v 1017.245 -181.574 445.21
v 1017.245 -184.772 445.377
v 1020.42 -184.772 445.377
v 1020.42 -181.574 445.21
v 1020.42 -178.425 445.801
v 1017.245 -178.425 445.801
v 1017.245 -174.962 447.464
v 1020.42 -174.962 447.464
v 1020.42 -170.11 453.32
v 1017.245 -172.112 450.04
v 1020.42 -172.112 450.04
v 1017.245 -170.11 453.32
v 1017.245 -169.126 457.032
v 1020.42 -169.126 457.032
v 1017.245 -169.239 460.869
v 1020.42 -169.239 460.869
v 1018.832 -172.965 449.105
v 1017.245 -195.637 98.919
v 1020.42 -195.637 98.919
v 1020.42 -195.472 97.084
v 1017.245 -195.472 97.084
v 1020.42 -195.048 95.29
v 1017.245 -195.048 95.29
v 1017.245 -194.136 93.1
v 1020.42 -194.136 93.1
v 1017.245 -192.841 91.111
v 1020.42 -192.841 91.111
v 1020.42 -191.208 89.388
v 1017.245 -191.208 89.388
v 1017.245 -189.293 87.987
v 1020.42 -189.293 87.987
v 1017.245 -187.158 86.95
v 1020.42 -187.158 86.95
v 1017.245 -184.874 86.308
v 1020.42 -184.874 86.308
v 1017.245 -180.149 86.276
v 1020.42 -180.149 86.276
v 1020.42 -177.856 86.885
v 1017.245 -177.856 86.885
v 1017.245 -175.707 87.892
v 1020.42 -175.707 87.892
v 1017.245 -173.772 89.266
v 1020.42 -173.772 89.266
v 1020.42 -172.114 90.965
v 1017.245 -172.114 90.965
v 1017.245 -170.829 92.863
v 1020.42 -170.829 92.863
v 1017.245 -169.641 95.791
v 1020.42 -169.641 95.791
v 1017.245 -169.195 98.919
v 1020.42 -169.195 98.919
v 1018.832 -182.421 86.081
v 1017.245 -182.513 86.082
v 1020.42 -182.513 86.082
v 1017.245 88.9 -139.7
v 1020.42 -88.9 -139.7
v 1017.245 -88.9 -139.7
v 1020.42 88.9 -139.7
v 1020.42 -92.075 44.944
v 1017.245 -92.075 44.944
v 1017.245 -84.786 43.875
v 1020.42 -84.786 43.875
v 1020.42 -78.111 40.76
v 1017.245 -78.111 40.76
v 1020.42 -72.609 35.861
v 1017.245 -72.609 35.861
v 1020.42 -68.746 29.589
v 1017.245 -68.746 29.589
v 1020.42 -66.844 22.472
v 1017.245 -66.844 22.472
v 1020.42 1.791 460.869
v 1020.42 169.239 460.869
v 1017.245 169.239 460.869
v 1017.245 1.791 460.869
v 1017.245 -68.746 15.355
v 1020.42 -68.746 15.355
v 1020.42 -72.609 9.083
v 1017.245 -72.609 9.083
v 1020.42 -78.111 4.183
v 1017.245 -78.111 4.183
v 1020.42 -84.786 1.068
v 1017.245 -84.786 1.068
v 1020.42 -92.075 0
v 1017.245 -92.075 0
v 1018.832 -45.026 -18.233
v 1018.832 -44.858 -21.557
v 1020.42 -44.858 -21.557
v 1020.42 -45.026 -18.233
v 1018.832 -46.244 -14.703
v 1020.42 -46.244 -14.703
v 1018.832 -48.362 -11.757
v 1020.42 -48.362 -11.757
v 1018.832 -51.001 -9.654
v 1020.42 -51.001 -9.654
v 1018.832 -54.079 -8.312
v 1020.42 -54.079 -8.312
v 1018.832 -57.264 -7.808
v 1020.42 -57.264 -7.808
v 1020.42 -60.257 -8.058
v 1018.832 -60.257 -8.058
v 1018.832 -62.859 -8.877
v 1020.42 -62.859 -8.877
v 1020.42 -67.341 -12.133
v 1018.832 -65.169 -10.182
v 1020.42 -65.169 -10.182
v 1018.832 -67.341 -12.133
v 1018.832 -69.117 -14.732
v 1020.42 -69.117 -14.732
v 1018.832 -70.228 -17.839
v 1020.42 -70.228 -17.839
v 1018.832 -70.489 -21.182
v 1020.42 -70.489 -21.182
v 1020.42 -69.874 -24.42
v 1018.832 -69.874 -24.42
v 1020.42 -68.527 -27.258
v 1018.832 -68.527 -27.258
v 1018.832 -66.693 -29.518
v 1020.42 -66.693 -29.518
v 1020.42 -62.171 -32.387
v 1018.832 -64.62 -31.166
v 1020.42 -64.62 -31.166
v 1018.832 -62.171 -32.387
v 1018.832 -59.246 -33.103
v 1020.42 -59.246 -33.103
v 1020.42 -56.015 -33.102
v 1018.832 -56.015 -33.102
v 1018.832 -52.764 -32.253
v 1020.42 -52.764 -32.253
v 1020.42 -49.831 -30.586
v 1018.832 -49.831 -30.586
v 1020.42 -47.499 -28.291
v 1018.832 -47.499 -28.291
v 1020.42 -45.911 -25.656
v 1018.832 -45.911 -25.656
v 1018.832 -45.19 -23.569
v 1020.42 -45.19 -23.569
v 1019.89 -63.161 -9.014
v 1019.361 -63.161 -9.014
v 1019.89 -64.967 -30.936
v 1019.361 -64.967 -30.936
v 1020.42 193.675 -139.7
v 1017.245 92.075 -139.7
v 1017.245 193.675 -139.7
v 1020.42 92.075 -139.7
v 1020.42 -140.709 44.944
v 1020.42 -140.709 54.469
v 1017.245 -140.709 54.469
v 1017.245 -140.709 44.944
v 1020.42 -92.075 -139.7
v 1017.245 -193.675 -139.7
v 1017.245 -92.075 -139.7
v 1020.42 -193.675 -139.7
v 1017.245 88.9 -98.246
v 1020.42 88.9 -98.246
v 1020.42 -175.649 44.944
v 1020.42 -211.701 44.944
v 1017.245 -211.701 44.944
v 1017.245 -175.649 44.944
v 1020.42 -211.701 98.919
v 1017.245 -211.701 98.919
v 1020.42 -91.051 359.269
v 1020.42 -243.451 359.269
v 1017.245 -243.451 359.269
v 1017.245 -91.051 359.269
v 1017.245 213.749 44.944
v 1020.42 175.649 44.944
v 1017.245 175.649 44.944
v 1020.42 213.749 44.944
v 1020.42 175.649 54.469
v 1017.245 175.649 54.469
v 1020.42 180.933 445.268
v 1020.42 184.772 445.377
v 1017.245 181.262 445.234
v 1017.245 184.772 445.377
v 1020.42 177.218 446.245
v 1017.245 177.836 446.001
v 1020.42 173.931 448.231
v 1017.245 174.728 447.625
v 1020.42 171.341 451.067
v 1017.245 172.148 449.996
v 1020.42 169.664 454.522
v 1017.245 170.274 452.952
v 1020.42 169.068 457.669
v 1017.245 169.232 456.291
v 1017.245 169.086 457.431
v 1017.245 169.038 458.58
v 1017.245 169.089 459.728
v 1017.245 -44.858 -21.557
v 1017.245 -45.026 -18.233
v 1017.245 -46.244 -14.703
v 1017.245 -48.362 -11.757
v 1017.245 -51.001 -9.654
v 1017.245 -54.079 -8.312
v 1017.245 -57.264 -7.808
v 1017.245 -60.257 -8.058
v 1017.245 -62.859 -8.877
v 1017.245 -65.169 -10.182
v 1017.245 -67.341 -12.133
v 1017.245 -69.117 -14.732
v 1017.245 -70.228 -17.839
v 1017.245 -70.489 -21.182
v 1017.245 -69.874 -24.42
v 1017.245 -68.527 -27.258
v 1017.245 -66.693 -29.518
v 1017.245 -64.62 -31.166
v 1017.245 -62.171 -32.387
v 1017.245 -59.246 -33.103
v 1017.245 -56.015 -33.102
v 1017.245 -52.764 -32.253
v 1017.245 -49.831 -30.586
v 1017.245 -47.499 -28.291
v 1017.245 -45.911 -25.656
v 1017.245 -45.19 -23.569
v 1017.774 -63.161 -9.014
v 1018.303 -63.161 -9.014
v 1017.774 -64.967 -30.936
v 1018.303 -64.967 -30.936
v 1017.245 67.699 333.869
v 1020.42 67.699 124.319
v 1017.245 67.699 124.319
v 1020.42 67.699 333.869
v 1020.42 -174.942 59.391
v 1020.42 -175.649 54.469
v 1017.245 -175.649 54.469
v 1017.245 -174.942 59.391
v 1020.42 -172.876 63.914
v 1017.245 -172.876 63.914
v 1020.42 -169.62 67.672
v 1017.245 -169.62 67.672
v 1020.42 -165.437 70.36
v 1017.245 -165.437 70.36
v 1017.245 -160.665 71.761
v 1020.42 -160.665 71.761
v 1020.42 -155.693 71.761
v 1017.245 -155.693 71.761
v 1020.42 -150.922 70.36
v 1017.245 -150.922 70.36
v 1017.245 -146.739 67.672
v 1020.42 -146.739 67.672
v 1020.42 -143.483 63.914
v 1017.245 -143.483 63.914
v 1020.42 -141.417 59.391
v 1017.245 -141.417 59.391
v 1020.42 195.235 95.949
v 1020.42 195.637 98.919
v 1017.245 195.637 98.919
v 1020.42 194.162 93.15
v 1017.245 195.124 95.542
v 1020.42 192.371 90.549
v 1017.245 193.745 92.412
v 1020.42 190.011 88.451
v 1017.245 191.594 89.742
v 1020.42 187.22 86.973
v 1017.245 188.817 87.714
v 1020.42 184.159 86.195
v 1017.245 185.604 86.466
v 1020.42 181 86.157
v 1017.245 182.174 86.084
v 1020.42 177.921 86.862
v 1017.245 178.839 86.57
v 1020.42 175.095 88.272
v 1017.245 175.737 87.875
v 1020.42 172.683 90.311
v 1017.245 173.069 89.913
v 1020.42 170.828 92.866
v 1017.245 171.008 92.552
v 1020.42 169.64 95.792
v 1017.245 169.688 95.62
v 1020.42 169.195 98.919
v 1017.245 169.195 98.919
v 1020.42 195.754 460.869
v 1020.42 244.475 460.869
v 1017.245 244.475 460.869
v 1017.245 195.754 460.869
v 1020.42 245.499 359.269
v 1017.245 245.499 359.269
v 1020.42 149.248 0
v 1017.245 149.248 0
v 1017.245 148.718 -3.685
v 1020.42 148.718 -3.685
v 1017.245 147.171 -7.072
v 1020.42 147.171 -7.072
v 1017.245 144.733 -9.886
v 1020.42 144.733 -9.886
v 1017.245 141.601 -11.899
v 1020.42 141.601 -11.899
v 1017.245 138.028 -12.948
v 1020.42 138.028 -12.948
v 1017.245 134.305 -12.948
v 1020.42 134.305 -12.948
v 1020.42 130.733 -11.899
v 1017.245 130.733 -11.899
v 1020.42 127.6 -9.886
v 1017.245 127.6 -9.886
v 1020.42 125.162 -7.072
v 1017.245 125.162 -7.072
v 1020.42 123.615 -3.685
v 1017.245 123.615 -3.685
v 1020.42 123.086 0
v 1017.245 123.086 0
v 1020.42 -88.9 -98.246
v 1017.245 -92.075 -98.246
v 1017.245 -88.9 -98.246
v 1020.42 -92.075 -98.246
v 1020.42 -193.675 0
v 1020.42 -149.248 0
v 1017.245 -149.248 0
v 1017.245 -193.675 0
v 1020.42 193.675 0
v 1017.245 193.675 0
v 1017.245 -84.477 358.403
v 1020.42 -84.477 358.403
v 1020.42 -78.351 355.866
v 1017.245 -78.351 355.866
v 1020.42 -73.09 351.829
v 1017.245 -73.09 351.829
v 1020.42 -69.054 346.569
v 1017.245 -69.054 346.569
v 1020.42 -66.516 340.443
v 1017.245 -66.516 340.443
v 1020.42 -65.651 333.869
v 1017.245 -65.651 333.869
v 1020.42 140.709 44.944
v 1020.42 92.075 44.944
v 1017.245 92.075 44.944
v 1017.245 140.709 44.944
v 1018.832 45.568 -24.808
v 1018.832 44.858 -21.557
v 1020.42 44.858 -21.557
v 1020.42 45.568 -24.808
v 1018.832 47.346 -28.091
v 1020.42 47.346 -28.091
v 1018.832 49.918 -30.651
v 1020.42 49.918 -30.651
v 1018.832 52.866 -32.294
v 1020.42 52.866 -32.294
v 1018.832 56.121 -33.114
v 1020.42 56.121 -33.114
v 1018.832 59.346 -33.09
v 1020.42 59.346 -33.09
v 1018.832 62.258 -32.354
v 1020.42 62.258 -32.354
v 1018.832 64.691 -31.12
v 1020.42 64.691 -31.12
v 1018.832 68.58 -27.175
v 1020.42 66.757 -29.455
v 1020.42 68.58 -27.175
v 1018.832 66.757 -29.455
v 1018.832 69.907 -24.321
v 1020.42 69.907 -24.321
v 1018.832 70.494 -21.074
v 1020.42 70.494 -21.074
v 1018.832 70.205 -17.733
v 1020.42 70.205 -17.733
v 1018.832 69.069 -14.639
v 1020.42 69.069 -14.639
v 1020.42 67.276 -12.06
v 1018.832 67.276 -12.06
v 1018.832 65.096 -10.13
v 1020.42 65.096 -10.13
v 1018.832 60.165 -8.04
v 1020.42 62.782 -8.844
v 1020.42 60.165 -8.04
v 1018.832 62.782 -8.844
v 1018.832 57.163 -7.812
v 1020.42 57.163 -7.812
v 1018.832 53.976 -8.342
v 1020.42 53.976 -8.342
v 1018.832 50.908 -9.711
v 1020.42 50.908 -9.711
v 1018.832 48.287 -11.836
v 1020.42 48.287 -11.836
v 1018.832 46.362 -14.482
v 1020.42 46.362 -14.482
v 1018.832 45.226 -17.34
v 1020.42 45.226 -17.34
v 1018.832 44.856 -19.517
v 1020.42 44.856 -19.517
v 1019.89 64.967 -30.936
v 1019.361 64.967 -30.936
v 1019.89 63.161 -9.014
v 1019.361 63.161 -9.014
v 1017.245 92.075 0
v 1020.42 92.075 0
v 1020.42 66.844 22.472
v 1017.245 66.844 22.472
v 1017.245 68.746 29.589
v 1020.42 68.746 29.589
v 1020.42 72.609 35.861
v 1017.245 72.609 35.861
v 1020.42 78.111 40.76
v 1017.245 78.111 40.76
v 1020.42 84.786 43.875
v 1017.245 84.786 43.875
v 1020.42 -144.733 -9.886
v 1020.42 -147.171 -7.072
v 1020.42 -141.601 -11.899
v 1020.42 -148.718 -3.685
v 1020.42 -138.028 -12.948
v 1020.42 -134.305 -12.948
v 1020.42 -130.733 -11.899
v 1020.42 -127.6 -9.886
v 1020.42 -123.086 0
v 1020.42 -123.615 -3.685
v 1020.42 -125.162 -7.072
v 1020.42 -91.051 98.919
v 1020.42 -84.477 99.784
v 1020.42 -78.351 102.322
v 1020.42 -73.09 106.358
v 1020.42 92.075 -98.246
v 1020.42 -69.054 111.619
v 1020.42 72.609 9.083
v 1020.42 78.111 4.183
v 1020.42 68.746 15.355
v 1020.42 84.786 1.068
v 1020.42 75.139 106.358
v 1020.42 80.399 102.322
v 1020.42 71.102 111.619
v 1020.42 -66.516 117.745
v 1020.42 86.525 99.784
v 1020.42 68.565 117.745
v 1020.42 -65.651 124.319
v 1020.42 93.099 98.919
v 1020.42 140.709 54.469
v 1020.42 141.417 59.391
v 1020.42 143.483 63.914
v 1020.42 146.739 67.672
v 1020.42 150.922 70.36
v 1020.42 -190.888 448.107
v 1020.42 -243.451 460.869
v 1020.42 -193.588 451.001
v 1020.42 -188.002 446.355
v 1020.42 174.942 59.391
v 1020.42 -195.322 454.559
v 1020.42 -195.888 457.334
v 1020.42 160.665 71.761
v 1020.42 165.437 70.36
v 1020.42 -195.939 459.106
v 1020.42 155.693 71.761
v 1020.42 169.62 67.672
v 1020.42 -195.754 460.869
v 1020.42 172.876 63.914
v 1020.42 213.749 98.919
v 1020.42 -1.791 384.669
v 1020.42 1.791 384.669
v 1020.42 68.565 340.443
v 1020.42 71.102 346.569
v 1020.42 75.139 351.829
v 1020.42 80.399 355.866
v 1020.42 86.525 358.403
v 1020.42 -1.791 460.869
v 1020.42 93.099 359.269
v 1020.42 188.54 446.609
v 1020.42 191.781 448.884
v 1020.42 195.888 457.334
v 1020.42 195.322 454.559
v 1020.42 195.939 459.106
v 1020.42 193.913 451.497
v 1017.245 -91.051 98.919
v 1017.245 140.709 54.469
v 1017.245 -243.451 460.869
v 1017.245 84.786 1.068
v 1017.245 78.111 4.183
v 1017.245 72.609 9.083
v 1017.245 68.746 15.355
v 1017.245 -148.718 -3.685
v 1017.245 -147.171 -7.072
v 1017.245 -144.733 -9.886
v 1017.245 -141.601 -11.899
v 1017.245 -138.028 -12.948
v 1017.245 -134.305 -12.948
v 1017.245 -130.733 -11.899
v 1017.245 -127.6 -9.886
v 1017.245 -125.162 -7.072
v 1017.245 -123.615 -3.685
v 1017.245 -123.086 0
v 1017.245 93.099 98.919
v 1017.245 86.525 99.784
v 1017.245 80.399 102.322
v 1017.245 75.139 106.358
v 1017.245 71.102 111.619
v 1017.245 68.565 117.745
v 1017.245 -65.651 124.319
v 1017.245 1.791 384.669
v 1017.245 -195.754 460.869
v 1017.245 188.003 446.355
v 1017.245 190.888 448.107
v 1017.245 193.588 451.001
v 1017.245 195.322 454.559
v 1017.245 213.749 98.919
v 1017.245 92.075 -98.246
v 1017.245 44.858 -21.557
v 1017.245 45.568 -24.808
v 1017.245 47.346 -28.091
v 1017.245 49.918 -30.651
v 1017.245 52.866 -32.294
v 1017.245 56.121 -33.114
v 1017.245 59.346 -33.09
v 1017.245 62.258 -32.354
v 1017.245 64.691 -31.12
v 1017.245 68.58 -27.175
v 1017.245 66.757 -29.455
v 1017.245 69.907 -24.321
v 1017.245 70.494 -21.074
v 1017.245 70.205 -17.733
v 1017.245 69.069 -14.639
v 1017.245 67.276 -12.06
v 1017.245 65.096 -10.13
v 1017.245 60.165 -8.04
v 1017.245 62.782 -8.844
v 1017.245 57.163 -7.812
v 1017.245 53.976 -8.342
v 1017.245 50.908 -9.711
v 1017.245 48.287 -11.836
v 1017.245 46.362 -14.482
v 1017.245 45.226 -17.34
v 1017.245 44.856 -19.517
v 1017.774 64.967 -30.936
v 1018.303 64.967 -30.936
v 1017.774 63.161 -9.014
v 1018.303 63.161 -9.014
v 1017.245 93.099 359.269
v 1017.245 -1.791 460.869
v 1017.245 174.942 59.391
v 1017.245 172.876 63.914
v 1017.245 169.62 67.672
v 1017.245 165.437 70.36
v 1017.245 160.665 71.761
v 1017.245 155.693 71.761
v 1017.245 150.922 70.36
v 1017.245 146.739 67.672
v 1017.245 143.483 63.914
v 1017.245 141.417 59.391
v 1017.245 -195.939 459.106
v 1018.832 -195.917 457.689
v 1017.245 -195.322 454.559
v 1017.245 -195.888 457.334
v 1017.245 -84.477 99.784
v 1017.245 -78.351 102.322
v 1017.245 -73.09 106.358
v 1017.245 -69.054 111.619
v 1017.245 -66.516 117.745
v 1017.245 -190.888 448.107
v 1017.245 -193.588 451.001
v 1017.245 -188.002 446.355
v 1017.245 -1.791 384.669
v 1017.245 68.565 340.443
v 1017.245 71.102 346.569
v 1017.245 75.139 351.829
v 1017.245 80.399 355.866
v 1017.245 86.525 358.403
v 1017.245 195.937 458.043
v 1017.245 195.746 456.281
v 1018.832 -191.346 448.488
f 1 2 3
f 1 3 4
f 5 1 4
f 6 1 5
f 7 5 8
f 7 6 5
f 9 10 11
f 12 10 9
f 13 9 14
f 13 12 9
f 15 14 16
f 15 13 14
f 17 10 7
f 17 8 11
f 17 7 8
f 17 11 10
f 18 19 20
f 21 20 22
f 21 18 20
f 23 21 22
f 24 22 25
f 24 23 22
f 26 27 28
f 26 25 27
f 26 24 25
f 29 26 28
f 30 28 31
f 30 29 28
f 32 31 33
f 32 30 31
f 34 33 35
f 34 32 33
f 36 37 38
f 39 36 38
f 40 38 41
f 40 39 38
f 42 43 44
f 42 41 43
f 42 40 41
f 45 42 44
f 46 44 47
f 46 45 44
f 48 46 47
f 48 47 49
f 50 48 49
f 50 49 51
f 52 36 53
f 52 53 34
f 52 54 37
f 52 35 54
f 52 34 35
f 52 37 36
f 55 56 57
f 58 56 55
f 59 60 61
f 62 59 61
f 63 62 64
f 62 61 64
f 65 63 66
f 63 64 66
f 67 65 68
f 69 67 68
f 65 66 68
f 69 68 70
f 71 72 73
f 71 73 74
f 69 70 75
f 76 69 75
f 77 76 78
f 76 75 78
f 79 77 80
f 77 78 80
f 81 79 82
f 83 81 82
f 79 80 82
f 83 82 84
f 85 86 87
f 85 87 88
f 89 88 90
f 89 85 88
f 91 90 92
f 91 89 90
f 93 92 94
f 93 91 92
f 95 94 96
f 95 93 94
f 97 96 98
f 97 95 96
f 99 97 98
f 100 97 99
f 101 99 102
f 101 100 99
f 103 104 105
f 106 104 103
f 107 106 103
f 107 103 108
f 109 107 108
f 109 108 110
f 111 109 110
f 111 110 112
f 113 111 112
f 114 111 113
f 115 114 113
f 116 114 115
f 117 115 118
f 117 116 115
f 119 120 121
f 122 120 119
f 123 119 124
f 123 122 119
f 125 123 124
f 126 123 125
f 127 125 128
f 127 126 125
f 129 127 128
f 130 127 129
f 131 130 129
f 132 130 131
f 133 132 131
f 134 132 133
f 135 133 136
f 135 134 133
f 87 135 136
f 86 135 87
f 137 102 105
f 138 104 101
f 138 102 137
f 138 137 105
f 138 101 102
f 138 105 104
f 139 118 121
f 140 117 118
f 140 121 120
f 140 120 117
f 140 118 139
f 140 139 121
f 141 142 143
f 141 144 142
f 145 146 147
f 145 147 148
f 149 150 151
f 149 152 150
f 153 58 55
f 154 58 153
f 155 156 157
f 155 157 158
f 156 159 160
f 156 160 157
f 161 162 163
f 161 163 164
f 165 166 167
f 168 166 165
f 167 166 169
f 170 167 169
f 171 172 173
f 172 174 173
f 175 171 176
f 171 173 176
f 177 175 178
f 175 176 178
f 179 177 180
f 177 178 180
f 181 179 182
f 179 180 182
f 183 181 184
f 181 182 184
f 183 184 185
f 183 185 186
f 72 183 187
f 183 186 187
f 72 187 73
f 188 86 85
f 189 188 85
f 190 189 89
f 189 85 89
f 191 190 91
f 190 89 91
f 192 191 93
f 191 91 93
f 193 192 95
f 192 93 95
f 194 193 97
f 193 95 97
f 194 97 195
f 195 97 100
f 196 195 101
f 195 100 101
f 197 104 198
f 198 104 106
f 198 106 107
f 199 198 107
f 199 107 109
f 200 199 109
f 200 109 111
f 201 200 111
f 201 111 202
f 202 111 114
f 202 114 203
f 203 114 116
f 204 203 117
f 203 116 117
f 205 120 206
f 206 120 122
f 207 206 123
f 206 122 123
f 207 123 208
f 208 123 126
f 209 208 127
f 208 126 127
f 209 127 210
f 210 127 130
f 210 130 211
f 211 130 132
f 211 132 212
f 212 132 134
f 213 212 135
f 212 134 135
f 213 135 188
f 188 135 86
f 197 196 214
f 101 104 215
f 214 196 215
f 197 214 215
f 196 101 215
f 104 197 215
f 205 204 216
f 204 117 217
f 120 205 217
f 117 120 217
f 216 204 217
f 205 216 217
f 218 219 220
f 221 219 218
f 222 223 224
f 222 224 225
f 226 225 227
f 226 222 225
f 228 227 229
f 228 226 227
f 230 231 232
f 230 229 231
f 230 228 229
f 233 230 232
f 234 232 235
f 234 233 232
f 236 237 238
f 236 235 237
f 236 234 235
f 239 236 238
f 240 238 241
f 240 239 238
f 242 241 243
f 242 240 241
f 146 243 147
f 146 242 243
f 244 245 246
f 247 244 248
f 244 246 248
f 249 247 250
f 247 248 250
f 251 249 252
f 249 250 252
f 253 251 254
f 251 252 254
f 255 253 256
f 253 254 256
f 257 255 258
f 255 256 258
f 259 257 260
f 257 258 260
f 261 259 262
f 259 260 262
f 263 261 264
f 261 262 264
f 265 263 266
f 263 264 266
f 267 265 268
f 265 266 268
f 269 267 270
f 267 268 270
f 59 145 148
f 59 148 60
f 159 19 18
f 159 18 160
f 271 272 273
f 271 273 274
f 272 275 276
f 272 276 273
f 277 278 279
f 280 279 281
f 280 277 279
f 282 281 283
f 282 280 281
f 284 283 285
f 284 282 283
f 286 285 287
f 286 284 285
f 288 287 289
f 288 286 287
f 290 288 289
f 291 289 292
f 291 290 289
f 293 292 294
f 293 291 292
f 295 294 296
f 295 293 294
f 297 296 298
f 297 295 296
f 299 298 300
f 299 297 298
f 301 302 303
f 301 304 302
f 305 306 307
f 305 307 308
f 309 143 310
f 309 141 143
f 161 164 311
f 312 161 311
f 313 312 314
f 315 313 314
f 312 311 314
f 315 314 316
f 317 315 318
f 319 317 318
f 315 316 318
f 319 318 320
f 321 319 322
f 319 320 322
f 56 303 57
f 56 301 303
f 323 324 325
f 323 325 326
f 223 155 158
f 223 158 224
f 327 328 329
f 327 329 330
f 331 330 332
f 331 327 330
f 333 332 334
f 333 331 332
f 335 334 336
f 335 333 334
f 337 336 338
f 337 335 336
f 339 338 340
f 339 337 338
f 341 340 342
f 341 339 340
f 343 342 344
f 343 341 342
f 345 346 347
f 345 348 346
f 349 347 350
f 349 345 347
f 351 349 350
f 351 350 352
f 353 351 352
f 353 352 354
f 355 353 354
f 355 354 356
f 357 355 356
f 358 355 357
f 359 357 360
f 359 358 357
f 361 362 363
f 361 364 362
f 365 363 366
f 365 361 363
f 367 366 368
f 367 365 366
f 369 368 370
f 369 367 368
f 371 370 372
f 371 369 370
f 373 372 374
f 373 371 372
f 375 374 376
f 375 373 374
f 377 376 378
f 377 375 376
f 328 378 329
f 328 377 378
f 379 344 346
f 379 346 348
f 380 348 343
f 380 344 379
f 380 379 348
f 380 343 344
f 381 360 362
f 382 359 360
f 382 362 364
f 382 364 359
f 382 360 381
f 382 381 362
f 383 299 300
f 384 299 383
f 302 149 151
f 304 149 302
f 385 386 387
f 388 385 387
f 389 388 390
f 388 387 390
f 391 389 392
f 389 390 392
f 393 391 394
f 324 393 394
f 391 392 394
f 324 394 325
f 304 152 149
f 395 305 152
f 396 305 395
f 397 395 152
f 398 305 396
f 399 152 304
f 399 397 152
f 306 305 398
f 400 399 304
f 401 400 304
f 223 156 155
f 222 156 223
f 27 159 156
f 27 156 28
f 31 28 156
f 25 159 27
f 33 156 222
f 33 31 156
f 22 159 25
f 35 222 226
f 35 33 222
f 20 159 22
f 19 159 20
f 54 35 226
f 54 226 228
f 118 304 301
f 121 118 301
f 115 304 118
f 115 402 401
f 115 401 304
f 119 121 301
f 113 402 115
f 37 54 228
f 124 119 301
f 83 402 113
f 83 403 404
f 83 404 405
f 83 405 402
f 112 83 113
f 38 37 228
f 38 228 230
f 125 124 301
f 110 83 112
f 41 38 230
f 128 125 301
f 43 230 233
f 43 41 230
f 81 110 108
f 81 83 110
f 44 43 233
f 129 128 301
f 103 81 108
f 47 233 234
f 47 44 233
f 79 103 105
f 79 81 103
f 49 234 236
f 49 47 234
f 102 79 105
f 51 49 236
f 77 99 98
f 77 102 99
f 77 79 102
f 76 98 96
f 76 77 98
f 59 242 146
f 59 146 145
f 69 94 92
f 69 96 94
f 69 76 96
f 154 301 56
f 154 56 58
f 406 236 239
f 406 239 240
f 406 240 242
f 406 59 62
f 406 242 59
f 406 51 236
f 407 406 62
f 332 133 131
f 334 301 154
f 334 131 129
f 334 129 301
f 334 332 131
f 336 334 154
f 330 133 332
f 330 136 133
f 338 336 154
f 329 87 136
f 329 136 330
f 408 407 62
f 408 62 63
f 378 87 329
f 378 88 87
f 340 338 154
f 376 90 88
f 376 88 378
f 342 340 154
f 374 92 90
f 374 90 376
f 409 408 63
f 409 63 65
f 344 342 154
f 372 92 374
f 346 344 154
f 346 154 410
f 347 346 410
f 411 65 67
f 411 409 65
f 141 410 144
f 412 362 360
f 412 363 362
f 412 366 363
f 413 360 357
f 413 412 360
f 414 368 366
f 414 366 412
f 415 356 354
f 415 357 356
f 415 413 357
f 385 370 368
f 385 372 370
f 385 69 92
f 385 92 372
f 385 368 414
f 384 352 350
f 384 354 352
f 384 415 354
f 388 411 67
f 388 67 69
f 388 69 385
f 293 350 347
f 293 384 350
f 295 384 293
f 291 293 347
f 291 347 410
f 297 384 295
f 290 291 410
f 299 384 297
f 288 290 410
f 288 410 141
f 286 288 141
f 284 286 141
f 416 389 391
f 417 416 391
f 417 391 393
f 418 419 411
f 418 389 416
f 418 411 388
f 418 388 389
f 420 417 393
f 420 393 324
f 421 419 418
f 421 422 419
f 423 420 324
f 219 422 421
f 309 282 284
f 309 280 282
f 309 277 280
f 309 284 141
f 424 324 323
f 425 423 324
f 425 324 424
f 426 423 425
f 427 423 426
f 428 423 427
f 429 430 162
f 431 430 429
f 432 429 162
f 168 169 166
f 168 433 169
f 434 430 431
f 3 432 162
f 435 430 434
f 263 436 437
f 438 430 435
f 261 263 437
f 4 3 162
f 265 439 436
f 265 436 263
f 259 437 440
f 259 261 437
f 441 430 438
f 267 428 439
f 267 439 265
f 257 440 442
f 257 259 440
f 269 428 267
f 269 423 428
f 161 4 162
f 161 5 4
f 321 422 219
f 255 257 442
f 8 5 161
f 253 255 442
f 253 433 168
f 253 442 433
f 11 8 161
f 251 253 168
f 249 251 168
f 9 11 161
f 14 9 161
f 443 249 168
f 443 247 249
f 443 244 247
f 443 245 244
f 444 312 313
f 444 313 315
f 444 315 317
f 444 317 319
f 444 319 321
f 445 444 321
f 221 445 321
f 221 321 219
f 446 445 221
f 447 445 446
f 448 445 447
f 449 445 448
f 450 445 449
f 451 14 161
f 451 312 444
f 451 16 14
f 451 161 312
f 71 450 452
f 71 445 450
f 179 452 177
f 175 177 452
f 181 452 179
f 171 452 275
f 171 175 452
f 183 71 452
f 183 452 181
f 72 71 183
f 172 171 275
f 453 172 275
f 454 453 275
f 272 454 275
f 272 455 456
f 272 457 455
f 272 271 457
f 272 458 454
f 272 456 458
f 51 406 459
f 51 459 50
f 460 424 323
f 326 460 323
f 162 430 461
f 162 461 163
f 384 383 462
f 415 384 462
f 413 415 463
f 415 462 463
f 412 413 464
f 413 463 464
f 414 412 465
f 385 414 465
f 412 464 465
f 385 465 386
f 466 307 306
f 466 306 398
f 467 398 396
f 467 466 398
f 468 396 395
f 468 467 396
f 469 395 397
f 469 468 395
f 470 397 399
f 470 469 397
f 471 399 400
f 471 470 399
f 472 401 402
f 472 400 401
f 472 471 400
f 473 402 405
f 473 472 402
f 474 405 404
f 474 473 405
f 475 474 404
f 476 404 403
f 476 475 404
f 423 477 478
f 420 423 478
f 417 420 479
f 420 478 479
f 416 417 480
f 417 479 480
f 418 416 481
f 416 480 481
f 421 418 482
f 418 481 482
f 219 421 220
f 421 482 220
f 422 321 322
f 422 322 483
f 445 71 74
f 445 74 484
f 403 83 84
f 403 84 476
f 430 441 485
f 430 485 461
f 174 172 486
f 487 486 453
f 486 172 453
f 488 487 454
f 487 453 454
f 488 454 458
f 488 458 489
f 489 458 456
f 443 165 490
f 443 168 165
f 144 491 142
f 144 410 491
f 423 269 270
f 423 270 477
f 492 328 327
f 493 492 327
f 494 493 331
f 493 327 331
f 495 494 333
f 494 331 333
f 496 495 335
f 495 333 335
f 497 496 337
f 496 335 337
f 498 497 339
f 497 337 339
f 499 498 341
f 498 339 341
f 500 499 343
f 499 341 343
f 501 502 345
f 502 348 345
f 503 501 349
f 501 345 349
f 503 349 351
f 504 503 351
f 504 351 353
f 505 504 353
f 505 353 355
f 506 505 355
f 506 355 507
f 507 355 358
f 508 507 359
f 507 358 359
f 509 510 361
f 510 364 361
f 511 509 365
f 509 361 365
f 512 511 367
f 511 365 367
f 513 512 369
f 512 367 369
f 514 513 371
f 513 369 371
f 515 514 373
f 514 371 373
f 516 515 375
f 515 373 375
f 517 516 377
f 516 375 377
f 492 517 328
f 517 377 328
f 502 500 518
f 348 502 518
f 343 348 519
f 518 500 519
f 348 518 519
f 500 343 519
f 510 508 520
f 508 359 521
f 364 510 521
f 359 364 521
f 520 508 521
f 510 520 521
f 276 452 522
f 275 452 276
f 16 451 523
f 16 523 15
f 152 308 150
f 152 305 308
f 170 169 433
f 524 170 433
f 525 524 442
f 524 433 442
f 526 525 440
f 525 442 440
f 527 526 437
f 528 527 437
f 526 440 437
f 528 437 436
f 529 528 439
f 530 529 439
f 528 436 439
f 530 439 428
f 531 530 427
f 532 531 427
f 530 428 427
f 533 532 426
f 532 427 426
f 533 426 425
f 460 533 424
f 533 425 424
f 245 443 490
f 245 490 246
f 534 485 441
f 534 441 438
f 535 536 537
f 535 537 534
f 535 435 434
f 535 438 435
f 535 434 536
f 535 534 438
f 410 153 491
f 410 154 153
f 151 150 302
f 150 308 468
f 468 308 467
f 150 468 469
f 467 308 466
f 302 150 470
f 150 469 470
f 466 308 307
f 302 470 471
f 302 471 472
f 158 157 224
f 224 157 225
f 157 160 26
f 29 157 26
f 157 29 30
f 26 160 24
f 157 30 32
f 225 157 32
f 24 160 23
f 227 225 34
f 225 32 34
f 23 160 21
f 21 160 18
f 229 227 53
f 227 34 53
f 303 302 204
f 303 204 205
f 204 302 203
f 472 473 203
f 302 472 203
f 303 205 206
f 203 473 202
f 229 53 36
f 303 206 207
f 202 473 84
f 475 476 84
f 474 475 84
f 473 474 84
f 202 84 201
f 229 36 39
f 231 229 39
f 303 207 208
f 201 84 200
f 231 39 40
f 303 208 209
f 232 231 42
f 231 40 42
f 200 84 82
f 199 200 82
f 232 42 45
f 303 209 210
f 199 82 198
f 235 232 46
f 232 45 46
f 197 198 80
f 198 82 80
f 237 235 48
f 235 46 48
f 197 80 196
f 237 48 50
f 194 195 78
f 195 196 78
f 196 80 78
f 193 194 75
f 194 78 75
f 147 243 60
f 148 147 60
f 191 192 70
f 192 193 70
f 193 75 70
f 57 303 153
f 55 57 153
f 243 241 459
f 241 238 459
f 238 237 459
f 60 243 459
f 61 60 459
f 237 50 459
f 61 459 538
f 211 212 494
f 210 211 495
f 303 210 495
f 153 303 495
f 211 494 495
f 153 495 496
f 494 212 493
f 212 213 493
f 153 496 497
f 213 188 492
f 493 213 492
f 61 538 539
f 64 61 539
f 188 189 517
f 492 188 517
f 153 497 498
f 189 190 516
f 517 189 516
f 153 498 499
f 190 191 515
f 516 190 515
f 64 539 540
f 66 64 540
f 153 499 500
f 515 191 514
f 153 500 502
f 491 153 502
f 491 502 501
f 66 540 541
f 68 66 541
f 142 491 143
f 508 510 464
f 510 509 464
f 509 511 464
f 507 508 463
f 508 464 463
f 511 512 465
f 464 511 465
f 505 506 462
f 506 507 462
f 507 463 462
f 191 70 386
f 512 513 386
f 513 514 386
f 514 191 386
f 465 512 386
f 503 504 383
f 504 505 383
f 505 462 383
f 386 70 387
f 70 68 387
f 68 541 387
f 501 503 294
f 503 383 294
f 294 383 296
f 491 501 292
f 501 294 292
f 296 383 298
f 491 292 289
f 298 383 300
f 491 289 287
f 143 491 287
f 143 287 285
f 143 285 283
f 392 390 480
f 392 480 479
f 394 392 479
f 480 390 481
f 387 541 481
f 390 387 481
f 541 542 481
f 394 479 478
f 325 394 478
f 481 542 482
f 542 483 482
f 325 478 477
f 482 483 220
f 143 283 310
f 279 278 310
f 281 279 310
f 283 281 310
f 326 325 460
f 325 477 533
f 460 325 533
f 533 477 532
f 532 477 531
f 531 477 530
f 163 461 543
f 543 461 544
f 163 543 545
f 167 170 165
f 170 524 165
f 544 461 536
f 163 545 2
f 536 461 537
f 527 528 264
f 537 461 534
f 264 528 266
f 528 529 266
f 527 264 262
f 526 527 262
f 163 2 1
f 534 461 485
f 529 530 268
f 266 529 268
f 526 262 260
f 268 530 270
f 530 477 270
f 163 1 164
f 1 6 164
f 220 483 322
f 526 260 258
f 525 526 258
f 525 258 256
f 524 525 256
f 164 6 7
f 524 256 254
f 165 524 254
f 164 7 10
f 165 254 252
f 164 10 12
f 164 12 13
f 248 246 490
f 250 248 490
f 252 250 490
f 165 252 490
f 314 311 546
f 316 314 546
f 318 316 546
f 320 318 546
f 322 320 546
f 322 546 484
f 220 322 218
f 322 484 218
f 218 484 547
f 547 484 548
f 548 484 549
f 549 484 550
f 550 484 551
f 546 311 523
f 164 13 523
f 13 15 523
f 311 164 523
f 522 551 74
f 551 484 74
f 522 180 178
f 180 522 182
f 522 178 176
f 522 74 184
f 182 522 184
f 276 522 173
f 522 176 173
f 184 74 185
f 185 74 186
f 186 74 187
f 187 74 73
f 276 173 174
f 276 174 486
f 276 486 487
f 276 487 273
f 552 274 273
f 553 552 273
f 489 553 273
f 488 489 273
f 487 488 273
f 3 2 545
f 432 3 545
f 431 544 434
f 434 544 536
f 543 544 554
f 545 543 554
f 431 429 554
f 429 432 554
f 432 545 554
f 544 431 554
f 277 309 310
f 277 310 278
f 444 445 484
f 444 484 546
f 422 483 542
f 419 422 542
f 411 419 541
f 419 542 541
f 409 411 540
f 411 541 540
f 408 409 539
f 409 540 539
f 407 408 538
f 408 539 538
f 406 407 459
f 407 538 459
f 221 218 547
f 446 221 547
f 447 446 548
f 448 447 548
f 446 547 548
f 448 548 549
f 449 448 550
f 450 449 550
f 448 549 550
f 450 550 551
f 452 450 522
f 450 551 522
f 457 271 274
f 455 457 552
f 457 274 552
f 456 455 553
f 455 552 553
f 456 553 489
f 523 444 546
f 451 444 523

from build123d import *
from OCP.BRepAlgoAPI import BRepAlgoAPI_Cut
from OCP.TopTools import TopTools_ListOfShape

# Parameters (mm, degrees)
BOSS_EXTRUDE1_DEPTH = 1.5875
SKETCH2_R           = 13.081
CUT_EXTRUDE1_DEPTH  = 117.6782
CUT_EXTRUDE2_REACH  = 864.179
SKETCH3_R           = 13.081
SKETCH7_RX          = 13.456940142
SKETCH7_RY          = 13.355964413
CUT_EXTRUDE5_DEPTH  = 523.187556795
SKETCH9_RX          = 13.445467768
SKETCH9_RY          = 13.391794978
CUT_EXTRUDE6_DEPTH  = 523.187556795
SKETCH10_RX         = 13.456940142
SKETCH10_RY         = 13.397800125
CUT_EXTRUDE7_DEPTH  = 523.187556799
CUT_EXTRUDE8_REACH  = 572.923
SKETCH11_R          = 13.081
SKETCH19_RX         = 13.223312173
SKETCH19_RY         = 13.081030132
CUT_EXTRUDE13_DEPTH = 523.187556806
MIRROR1_START       = 1016
MIRROR1_DEPTH       = 5
FILLET1_START       = 1017.2446
FILLET1_DEPTH       = 3.175
CUT_EXTRUDE14_DEPTH = 523.187556802


with BuildPart() as part:
    # Sketch1 → Boss-Extrude1 (new, symmetric)
    with BuildSketch(Plane(origin=(1018.8321, 0, 0), x_dir=(0, 0, -1), z_dir=(1, 0, 0))):
        Polygon((-44.943661408, 213.749166265), (-98.918661408, 213.749166265), (-98.918661408, 67.699166265), (-359.268661408, 67.699166265), (-359.268661408, 245.499166265), (-460.868661408, 244.475), (-460.868661408, 66.675), (-460.868661408, 1.7907), (-384.668661408, 1.7907), (-384.668661408, -1.7907), (-460.868661408, -1.7907), (-460.868661408, -66.675), (-460.868661408, -243.450833735), (-359.268661408, -243.450833735), (-359.268661408, -65.650833735), (-98.918661408, -65.650833735), (-98.918661408, -211.700833735), (-44.943661408, -211.700833735), (-44.943661408, -66.675), (0, -66.675), (0, -193.675), (139.7, -193.675), (139.7, -92.075), (98.24556941, -92.075), (98.24556941, -88.9), (139.7, -88.9), (139.7, 88.9), (98.24556941, 88.9), (98.24556941, 92.075), (139.7, 92.075), (139.7, 193.675), (0, 193.675), (0, 66.675), (-44.943661408, 66.675), align=None)
        with BuildLine():
            add(Edge.make_bspline(
                [(21.556758498, -44.857666301), (-0.366066463, -43.052189708), (9.01360266, -63.161093791), (18.393271782, -83.269997873), (30.936427621, -64.966570384), (43.479583459, -46.663142895), (21.556758498, -44.857666301)],
                knots=[0, 0, 0, 2.094395102, 2.094395102, 4.188790205, 4.188790205, 6.283185307, 6.283185307, 6.283185307], degree=2, weights=[1, 0.5, 1, 0.5, 1, 0.5, 1]))
        make_face(mode=Mode.SUBTRACT)
        with BuildLine():
            add(Edge.make_bspline(
                [(21.556758498, 44.857666301), (43.479583459, 46.663142895), (30.936427621, 64.966570384), (18.393271782, 83.269997873), (9.01360266, 63.161093791), (-0.366066463, 43.052189708), (21.556758498, 44.857666301)],
                knots=[0, 0, 0, 2.094395102, 2.094395102, 4.188790205, 4.188790205, 6.283185307, 6.283185307, 6.283185307], degree=2, weights=[1, 0.5, 1, 0.5, 1, 0.5, 1]))
        make_face(mode=Mode.SUBTRACT)
    extrude(amount=BOSS_EXTRUDE1_DEPTH, both=True)

    # Sketch2 → Cut-Extrude1 (cut)
    with BuildSketch(Plane(origin=(1134.9228, 136.166603714, 0), x_dir=(0, 0, 1), z_dir=(-1, 0, 0))):
        Circle(SKETCH2_R)
    extrude(amount=CUT_EXTRUDE1_DEPTH, mode=Mode.SUBTRACT)

    # Cut-Extrude2: up to this plane
    cut_extrude2_end = Plane(origin=(1017.2446, 0, 0), z_dir=(1, 0, 0))
    # Sketch3 → Cut-Extrude2 (cut, up to the surface)
    with BuildSketch(Plane(origin=(1630.2228, 139.7, 330.2), x_dir=(0.2050222561191695, -0.014387526745204883, 0.9786515588144545), z_dir=(-0.9762506927412319, 0.06850882054324438, 0.20552646162973348)), mode=Mode.PRIVATE) as cut_extrude2_sk1:
        Circle(SKETCH3_R)
    cut_extrude2_tool1 = split(extrude(cut_extrude2_sk1.sketch, amount=CUT_EXTRUDE2_REACH, mode=Mode.PRIVATE), bisect_by=cut_extrude2_end, keep=Keep.BOTH, mode=Mode.PRIVATE)
    add(cut_extrude2_tool1.solids().sort_by_distance((1630.2228, 139.7, 330.2))[0], mode=Mode.SUBTRACT)

    # Sketch7 → Cut-Extrude5 (cut, through all)
    with BuildSketch(Plane.ZY.offset(-1017.2446)):
        with Locations(Location((458.579621053, 182.493207018), (0, 0, 80.206302576))):
            Ellipse(SKETCH7_RX, SKETCH7_RY)
    extrude(amount=-CUT_EXTRUDE5_DEPTH, mode=Mode.SUBTRACT)

    # Sketch9 → Cut-Extrude6 (cut, through all)
    with BuildSketch(Plane(origin=(1020.4196, 0, 0), x_dir=(0, 0, -1), z_dir=(1, 0, 0))):
        with Locations(Location((-458.579621053, 182.493207018), (0, 0, -99.802136374))):
            Ellipse(SKETCH9_RX, SKETCH9_RY)
    extrude(amount=-CUT_EXTRUDE6_DEPTH, mode=Mode.SUBTRACT)

    # Sketch10 → Cut-Extrude7 (cut, through all)
    with BuildSketch(Plane.ZY.offset(-1017.2446)):
        with Locations(Location((458.579621053, 182.493207018), (0, 0, 80.206302562))):
            Ellipse(SKETCH10_RX, SKETCH10_RY)
    extrude(amount=-CUT_EXTRUDE7_DEPTH, mode=Mode.SUBTRACT)

    # Cut-Extrude8: up to this plane
    cut_extrude8_end = Plane(origin=(1017.2446, 0, 0), z_dir=(1, 0, 0))
    # Sketch11 → Cut-Extrude8 (cut, up to the surface)
    with BuildSketch(Plane(origin=(1134.9228, 182.523820118, 99.41306), x_dir=(0.0021298200845781975, 1.9540206598432437e-06, -0.9999977319287225), z_dir=(0.9999973110652725, 0.0009174556197295962, 0.0021298209809440367)), mode=Mode.PRIVATE) as cut_extrude8_sk1:
        Circle(SKETCH11_R)
    cut_extrude8_tool1 = split(extrude(cut_extrude8_sk1.sketch, amount=-CUT_EXTRUDE8_REACH, mode=Mode.PRIVATE), bisect_by=cut_extrude8_end, keep=Keep.BOTH, mode=Mode.PRIVATE)
    add(cut_extrude8_tool1.solids().sort_by_distance((1134.9228, 182.52382, 99.41306))[0], mode=Mode.SUBTRACT)


with BuildPart() as cut_extrude13_tool:
    # Sketch19 → Cut-Extrude13 (new, through all)
    with BuildSketch(Plane.ZY.offset(-1017.2446)):
        with Locations(Location((99.162425827, 182.415855302), (0, 0, 91.056275717))):
            Ellipse(SKETCH19_RX, SKETCH19_RY)
    extrude(amount=-CUT_EXTRUDE13_DEPTH)


with BuildPart() as part_1:
    add(part.part)

    # Cut-Extrude13: cut by cut_extrude13_tool, with a tolerance
    cut_extrude13_stock = TopTools_ListOfShape()
    cut_extrude13_stock.Append(part_1.part.wrapped)
    cut_extrude13_tools = TopTools_ListOfShape()
    cut_extrude13_tools.Append(cut_extrude13_tool.part.wrapped)
    cut_extrude13_cut = BRepAlgoAPI_Cut()
    cut_extrude13_cut.SetArguments(cut_extrude13_stock)
    cut_extrude13_cut.SetTools(cut_extrude13_tools)
    cut_extrude13_cut.SetFuzzyValue(0.00001)
    cut_extrude13_cut.Build()
    add(Compound.cast(cut_extrude13_cut.Shape()).solids(), mode=Mode.REPLACE)

    # Mirror1: read off the stored shape, not the designer's step
    # Mirror1 outline → Mirror1 (cut)
    with BuildSketch(Plane.YZ.offset(MIRROR1_START)):
        with BuildLine():
            add(Edge.make_bspline(
                [(-184.772187594, 445.377072218), (-192.867269369, 446.753422284), (-195.322490897, 454.559086735)],
                knots=[1.911546311, 1.911546311, 1.911546311, 3.008453954, 3.008453954, 3.008453954], degree=2, weights=[1, 0.85333167, 1]))
            add(Edge.make_bspline(
                [(-184.772187594, 445.377072218), (-165.948609057, 442.127807973), (-169.239167993, 460.868661408)],
                knots=[1.570796327, 1.570796327, 1.570796327, 3.484936818, 3.484936818, 3.484936818], degree=2, weights=[1, 0.575917551, 1]))
            Line((-169.239167993, 460.868661408), (-195.754033999, 460.868661411))
            add(Edge.make_bspline(
                [(-195.754033999, 460.868661411), (-196.307414343, 457.662828466), (-195.322490897, 454.559086735)],
                knots=[0, 0, 0, 0.476417942, 0.476417942, 0.476417942], degree=2, weights=[1, 0.971762149, 1]))
        make_face()
        with BuildLine():
            Line((-169.194986689, 98.918661408), (-195.636920453, 98.918661408))
            add(Edge.make_bspline(
                [(-195.636920453, 98.918661408), (-195.40023147, 86.081347081), (-182.421128696, 86.081347081), (-169.442025922, 86.081347081), (-169.194986689, 98.918661408)],
                knots=[0, 0, 0, 1.552160362, 1.552160362, 3.104320723, 3.104320723, 3.104320723], degree=2, weights=[1, 0.713664798, 1, 0.713664798, 1]))
        make_face()
        with BuildLine():
            Line((-123.085603714, 0), (-149.247603714, 0))
            ThreePointArc((-149.247603714, 0), (-136.166603714, -13.081), (-123.085603714, 0))
        make_face()
    extrude(amount=MIRROR1_DEPTH, mode=Mode.SUBTRACT)

    # Fillet1: read off the stored shape, not the designer's step
    # Fillet1 outline → Fillet1 (add)
    with BuildSketch(Plane.YZ.offset(FILLET1_START)):
        with BuildLine():
            ThreePointArc((93.099166265, 98.918661408), (75.138654023, 106.358149166), (67.699166265, 124.318661408))
            Line((67.699166265, 124.318661408), (67.699166265, 98.918661408))
            Line((67.699166265, 98.918661408), (93.099166265, 98.918661408))
        make_face()
        with BuildLine():
            ThreePointArc((67.699166265, 333.868661408), (75.138654023, 351.82917365), (93.099166265, 359.268661408))
            Line((93.099166265, 359.268661408), (67.699166265, 359.268661408))
            Line((67.699166265, 359.268661408), (67.699166265, 333.868661408))
        make_face()
        with BuildLine():
            ThreePointArc((-91.050833735, 359.268661408), (-73.090321493, 351.82917365), (-65.650833735, 333.868661408))
            Line((-65.650833735, 333.868661408), (-65.650833735, 359.268661408))
            Line((-65.650833735, 359.268661408), (-91.050833735, 359.268661408))
        make_face()
        with BuildLine():
            Line((-65.650833735, 98.918661408), (-65.650833735, 124.318661408))
            ThreePointArc((-65.650833735, 124.318661408), (-73.090321493, 106.358149166), (-91.050833735, 98.918661408))
            Line((-91.050833735, 98.918661408), (-65.650833735, 98.918661408))
        make_face()
        with BuildLine():
            ThreePointArc((-66.84434752, 22.471830704), (-75.181443538, 6.43245535), (-92.075, 0))
            Line((-92.075, 0), (-66.675, 0))
            Line((-66.675, 0), (-66.675, 44.943661408))
            Line((-66.675, 44.943661408), (-92.075, 44.943661408))
            ThreePointArc((-92.075, 44.943661408), (-75.181443538, 38.511206058), (-66.84434752, 22.471830704))
        make_face()
        with BuildLine():
            ThreePointArc((92.075, 0), (75.181443538, 6.43245535), (66.84434752, 22.471830704))
            ThreePointArc((66.84434752, 22.471830704), (75.181443538, 38.511206058), (92.075, 44.943661408))
            Line((92.075, 44.943661408), (66.675, 44.943661408))
            Line((66.675, 44.943661408), (66.675, 0))
            Line((66.675, 0), (92.075, 0))
        make_face()
    extrude(amount=FILLET1_DEPTH)

    # Sketch20 → Cut-Extrude14 (cut, through all)
    with BuildSketch(Plane(origin=(1020.4196, 0, 0), x_dir=(0, 0, -1), z_dir=(1, 0, 0))):
        with BuildLine():
            Line((-54.468661408, 140.709369646), (-44.943661408, 140.709369646))
            Line((-44.943661408, 140.709369646), (-44.943661408, 175.649166265))
            Line((-44.943661408, 175.649166265), (-54.468661408, 175.649166265))
            ThreePointArc((-54.468661408, 175.649166265), (-71.938559718, 158.179267956), (-54.468661408, 140.709369646))
        make_face()
    cut_extrude14 = extrude(amount=-CUT_EXTRUDE14_DEPTH, mode=Mode.SUBTRACT)

    # Mirror2: Cut-Extrude14 across plane
    add(cut_extrude14.mirror(Plane.ZX), mode=Mode.SUBTRACT)


solid = part_1.part
